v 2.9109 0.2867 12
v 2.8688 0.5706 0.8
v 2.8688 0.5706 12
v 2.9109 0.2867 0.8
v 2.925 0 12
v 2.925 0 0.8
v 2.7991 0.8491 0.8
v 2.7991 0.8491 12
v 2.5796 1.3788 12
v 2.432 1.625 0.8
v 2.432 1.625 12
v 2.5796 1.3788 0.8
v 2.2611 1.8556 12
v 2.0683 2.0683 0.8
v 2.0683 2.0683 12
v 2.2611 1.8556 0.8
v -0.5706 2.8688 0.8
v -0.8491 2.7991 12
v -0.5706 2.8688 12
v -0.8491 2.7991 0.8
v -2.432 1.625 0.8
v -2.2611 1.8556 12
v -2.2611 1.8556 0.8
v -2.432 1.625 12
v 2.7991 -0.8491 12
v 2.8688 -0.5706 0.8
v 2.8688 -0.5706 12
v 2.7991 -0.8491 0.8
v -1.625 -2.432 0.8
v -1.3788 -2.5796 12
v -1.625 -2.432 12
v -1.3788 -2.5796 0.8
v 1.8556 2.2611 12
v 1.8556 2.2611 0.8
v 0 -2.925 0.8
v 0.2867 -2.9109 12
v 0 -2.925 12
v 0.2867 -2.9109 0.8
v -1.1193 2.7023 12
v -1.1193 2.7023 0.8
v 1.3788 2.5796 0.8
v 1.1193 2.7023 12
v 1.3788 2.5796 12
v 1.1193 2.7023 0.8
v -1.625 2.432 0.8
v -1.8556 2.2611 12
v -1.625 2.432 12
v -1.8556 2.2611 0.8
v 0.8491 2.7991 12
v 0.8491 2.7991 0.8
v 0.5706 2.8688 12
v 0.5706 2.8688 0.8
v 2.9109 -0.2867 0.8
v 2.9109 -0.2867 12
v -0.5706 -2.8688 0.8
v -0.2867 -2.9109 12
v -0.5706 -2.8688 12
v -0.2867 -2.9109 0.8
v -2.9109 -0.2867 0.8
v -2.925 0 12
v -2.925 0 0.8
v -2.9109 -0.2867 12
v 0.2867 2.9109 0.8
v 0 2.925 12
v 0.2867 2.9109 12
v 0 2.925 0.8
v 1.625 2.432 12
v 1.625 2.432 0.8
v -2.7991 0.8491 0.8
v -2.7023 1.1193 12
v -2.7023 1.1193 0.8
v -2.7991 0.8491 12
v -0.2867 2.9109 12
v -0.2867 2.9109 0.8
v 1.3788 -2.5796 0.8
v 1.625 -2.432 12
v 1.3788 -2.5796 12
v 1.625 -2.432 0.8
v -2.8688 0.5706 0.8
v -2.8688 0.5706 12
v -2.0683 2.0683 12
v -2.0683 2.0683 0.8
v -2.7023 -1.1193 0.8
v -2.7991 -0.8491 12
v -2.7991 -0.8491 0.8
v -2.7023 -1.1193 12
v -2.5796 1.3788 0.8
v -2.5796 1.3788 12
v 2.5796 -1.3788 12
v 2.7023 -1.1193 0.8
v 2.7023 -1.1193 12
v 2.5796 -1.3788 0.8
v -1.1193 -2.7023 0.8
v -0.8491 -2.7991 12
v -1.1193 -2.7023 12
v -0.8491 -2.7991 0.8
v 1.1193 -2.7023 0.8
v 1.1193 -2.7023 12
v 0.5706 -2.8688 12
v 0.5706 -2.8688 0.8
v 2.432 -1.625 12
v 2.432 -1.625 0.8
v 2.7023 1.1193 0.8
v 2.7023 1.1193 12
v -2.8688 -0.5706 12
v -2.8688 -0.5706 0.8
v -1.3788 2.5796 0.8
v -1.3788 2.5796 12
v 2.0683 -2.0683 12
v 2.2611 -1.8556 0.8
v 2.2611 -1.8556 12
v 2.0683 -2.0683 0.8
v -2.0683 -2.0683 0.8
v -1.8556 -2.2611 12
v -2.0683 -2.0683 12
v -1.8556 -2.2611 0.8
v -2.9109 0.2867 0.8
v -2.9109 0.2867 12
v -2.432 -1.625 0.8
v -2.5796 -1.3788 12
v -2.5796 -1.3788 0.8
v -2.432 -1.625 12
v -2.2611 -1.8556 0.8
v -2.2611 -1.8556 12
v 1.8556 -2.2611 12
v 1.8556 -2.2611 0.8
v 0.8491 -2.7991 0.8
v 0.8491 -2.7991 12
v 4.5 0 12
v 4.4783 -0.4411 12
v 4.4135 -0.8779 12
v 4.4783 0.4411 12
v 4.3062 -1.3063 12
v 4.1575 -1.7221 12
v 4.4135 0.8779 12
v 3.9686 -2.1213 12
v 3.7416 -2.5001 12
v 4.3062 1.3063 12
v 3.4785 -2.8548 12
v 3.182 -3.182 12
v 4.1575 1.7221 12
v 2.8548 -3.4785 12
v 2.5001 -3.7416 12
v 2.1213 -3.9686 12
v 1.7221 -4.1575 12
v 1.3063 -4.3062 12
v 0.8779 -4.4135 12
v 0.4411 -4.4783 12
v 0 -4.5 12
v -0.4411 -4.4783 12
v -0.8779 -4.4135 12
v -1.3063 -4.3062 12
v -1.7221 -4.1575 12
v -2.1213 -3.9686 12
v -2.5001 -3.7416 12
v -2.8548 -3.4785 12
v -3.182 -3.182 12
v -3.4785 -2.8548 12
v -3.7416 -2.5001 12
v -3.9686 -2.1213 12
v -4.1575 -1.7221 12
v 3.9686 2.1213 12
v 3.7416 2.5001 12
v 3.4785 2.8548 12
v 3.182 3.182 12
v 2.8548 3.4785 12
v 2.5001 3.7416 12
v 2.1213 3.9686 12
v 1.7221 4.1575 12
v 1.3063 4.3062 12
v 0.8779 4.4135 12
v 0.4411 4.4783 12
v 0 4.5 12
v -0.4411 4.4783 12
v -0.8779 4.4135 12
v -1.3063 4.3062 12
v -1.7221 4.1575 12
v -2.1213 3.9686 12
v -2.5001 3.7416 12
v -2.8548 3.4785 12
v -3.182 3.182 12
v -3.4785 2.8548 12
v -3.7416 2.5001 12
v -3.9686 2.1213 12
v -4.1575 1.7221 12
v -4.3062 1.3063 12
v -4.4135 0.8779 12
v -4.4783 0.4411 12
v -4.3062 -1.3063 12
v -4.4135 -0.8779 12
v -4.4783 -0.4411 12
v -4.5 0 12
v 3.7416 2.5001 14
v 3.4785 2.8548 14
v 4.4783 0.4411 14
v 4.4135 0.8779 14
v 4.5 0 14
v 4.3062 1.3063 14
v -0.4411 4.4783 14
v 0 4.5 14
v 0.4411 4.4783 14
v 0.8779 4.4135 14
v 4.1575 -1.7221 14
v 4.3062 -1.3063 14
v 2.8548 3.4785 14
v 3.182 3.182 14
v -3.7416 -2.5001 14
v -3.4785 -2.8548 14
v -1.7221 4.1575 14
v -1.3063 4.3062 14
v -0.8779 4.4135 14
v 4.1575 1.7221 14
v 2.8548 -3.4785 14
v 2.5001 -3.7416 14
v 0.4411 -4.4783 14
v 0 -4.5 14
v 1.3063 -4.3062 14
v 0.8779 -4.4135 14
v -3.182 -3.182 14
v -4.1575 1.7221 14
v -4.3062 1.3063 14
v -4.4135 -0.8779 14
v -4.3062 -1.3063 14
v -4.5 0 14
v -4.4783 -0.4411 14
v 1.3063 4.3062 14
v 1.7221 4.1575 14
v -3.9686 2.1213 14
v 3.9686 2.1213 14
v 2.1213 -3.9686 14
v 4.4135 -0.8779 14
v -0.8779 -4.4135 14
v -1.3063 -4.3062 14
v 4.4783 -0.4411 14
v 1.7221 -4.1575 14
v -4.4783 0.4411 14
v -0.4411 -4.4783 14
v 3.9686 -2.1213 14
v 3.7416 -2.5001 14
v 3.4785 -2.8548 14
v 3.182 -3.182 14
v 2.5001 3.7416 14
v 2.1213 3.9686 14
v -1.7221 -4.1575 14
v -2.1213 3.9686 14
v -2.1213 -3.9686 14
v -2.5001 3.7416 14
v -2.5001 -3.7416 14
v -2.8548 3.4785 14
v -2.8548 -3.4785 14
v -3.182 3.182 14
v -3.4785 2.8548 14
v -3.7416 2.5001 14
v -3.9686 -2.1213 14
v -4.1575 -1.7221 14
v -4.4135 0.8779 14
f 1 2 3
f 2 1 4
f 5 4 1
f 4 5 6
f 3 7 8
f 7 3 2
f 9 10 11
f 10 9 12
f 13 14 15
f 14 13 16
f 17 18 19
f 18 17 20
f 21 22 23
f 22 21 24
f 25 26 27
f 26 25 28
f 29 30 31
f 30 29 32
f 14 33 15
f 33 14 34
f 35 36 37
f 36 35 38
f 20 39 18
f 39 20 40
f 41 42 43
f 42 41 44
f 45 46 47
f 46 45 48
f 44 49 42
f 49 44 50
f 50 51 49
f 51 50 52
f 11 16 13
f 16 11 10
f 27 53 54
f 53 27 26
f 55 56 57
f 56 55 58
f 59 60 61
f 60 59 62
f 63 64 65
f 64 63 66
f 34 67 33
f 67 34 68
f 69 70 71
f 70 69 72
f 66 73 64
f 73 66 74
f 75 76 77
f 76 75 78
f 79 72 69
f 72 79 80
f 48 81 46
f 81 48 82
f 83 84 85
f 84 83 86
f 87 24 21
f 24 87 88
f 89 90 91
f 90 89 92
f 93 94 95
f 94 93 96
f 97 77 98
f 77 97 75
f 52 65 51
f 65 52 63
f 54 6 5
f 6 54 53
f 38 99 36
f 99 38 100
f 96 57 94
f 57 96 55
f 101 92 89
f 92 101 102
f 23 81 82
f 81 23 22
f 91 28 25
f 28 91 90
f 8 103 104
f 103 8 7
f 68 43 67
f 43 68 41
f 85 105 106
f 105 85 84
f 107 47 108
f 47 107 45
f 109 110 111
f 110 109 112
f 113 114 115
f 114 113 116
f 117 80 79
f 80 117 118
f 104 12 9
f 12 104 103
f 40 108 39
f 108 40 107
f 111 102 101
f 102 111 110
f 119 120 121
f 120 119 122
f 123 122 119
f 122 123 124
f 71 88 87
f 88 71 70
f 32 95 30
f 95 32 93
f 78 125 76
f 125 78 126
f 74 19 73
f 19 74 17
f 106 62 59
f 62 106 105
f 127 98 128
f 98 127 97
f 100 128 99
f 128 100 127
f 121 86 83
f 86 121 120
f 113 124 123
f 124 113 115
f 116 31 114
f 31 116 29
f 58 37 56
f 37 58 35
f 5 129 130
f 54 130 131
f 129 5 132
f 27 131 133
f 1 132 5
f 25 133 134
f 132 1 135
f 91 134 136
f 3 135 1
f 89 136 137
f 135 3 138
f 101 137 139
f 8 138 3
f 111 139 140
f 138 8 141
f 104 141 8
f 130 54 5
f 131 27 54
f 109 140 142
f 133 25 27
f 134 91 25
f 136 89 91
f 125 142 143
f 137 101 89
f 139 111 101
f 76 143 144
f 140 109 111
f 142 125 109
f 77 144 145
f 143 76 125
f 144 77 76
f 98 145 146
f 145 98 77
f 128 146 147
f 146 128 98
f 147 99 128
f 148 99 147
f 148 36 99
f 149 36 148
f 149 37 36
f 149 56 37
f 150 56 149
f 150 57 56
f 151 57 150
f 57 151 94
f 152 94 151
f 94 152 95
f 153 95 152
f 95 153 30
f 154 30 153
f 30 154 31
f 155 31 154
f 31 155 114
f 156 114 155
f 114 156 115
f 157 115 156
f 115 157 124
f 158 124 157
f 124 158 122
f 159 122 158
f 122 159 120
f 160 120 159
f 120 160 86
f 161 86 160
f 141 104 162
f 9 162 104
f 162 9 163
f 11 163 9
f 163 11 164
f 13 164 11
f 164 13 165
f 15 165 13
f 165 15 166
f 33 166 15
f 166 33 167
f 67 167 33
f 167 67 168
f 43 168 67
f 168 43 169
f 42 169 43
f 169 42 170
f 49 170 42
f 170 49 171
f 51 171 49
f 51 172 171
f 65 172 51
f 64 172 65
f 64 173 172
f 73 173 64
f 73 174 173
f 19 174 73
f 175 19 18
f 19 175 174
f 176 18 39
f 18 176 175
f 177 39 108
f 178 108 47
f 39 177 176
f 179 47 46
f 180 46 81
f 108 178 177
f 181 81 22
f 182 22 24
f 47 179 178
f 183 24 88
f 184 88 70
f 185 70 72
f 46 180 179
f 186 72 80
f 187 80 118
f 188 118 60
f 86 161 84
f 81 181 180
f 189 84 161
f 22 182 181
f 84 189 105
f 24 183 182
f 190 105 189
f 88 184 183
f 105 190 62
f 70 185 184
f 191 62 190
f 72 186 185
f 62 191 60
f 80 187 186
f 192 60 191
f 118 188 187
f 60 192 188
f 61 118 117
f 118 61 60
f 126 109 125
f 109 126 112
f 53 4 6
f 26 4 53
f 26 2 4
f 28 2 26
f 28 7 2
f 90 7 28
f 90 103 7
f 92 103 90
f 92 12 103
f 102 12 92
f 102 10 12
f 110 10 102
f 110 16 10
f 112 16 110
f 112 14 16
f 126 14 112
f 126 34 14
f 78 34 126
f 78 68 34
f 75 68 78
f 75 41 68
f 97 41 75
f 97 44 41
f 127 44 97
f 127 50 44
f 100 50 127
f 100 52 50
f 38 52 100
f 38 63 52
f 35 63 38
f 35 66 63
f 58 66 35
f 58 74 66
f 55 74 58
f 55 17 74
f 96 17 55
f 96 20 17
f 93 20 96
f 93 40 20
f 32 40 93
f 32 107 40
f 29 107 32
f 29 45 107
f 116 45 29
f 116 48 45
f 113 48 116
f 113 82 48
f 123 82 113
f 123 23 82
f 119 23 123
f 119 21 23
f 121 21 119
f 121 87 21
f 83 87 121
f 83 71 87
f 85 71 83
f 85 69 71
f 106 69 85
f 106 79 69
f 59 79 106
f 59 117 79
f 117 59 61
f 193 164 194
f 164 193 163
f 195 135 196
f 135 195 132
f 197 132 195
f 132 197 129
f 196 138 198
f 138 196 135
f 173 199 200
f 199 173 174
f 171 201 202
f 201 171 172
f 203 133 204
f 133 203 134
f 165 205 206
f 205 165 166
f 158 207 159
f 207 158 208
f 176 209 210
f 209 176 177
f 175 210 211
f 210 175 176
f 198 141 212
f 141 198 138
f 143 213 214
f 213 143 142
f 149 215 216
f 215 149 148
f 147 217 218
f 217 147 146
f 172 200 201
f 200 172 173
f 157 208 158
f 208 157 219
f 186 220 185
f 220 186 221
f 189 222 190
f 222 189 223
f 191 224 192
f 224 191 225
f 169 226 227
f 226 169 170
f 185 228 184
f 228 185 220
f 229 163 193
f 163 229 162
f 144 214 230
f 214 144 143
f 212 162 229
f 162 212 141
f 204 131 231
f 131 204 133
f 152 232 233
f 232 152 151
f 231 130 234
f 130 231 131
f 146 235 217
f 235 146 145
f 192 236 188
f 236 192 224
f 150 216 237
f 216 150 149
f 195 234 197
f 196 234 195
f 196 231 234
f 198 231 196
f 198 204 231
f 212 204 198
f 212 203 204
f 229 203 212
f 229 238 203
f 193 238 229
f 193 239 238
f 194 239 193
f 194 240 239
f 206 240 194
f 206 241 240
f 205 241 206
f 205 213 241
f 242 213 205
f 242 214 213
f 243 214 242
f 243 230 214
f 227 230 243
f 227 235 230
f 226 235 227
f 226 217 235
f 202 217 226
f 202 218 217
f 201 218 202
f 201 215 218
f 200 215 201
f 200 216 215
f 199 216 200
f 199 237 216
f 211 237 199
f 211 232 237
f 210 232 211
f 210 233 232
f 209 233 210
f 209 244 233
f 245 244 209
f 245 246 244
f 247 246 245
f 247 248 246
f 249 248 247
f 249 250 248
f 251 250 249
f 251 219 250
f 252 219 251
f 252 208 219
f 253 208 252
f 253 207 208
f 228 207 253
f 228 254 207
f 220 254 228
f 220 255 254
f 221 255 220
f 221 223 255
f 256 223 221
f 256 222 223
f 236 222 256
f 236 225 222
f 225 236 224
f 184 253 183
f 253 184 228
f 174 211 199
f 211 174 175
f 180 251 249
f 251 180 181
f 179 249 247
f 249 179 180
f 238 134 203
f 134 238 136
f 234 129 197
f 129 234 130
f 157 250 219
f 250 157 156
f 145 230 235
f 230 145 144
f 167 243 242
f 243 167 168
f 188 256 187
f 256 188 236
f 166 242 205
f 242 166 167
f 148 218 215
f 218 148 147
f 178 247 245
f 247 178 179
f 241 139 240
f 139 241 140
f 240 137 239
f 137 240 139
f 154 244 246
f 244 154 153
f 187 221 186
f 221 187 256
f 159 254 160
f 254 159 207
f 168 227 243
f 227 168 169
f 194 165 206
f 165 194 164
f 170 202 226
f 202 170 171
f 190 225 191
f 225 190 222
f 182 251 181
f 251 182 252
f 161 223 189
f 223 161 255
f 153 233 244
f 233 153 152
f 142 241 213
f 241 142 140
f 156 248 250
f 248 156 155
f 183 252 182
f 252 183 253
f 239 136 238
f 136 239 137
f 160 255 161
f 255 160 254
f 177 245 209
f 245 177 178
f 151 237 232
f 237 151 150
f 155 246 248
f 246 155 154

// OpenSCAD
// Registration pin for 6mm jig holes
// Print vertically (flange up) for best shaft roundness
// Adjust tolerance until you get a snug slip fit — try -0.15 first

hole_diameter  = 6.0;
tolerance      = -0.15;  // make more negative if loose, toward 0 if too tight

shaft_d        = hole_diameter + tolerance;
shaft_length   = 12.0;   // brass 4.76mm + acrylic 6mm + a little past
flange_d       = 9.0;    // wide enough to rest on top of brass
flange_h       = 2.0;
chamfer_h      = 0.8;    // lead-in taper at insertion tip

$fn = 64;

// flange (sits on top surface of brass)
translate([0, 0, shaft_length])
    cylinder(d=flange_d, h=flange_h);

// shaft with chamfered tip
difference() {
    cylinder(d=shaft_d, h=shaft_length);
    // chamfer: cone wider than shaft at z=0, narrowing to shaft_d at chamfer_h
    translate([0, 0, -0.01])
        cylinder(d1=shaft_d + 1, d2=shaft_d, h=chamfer_h + 0.01);
}
